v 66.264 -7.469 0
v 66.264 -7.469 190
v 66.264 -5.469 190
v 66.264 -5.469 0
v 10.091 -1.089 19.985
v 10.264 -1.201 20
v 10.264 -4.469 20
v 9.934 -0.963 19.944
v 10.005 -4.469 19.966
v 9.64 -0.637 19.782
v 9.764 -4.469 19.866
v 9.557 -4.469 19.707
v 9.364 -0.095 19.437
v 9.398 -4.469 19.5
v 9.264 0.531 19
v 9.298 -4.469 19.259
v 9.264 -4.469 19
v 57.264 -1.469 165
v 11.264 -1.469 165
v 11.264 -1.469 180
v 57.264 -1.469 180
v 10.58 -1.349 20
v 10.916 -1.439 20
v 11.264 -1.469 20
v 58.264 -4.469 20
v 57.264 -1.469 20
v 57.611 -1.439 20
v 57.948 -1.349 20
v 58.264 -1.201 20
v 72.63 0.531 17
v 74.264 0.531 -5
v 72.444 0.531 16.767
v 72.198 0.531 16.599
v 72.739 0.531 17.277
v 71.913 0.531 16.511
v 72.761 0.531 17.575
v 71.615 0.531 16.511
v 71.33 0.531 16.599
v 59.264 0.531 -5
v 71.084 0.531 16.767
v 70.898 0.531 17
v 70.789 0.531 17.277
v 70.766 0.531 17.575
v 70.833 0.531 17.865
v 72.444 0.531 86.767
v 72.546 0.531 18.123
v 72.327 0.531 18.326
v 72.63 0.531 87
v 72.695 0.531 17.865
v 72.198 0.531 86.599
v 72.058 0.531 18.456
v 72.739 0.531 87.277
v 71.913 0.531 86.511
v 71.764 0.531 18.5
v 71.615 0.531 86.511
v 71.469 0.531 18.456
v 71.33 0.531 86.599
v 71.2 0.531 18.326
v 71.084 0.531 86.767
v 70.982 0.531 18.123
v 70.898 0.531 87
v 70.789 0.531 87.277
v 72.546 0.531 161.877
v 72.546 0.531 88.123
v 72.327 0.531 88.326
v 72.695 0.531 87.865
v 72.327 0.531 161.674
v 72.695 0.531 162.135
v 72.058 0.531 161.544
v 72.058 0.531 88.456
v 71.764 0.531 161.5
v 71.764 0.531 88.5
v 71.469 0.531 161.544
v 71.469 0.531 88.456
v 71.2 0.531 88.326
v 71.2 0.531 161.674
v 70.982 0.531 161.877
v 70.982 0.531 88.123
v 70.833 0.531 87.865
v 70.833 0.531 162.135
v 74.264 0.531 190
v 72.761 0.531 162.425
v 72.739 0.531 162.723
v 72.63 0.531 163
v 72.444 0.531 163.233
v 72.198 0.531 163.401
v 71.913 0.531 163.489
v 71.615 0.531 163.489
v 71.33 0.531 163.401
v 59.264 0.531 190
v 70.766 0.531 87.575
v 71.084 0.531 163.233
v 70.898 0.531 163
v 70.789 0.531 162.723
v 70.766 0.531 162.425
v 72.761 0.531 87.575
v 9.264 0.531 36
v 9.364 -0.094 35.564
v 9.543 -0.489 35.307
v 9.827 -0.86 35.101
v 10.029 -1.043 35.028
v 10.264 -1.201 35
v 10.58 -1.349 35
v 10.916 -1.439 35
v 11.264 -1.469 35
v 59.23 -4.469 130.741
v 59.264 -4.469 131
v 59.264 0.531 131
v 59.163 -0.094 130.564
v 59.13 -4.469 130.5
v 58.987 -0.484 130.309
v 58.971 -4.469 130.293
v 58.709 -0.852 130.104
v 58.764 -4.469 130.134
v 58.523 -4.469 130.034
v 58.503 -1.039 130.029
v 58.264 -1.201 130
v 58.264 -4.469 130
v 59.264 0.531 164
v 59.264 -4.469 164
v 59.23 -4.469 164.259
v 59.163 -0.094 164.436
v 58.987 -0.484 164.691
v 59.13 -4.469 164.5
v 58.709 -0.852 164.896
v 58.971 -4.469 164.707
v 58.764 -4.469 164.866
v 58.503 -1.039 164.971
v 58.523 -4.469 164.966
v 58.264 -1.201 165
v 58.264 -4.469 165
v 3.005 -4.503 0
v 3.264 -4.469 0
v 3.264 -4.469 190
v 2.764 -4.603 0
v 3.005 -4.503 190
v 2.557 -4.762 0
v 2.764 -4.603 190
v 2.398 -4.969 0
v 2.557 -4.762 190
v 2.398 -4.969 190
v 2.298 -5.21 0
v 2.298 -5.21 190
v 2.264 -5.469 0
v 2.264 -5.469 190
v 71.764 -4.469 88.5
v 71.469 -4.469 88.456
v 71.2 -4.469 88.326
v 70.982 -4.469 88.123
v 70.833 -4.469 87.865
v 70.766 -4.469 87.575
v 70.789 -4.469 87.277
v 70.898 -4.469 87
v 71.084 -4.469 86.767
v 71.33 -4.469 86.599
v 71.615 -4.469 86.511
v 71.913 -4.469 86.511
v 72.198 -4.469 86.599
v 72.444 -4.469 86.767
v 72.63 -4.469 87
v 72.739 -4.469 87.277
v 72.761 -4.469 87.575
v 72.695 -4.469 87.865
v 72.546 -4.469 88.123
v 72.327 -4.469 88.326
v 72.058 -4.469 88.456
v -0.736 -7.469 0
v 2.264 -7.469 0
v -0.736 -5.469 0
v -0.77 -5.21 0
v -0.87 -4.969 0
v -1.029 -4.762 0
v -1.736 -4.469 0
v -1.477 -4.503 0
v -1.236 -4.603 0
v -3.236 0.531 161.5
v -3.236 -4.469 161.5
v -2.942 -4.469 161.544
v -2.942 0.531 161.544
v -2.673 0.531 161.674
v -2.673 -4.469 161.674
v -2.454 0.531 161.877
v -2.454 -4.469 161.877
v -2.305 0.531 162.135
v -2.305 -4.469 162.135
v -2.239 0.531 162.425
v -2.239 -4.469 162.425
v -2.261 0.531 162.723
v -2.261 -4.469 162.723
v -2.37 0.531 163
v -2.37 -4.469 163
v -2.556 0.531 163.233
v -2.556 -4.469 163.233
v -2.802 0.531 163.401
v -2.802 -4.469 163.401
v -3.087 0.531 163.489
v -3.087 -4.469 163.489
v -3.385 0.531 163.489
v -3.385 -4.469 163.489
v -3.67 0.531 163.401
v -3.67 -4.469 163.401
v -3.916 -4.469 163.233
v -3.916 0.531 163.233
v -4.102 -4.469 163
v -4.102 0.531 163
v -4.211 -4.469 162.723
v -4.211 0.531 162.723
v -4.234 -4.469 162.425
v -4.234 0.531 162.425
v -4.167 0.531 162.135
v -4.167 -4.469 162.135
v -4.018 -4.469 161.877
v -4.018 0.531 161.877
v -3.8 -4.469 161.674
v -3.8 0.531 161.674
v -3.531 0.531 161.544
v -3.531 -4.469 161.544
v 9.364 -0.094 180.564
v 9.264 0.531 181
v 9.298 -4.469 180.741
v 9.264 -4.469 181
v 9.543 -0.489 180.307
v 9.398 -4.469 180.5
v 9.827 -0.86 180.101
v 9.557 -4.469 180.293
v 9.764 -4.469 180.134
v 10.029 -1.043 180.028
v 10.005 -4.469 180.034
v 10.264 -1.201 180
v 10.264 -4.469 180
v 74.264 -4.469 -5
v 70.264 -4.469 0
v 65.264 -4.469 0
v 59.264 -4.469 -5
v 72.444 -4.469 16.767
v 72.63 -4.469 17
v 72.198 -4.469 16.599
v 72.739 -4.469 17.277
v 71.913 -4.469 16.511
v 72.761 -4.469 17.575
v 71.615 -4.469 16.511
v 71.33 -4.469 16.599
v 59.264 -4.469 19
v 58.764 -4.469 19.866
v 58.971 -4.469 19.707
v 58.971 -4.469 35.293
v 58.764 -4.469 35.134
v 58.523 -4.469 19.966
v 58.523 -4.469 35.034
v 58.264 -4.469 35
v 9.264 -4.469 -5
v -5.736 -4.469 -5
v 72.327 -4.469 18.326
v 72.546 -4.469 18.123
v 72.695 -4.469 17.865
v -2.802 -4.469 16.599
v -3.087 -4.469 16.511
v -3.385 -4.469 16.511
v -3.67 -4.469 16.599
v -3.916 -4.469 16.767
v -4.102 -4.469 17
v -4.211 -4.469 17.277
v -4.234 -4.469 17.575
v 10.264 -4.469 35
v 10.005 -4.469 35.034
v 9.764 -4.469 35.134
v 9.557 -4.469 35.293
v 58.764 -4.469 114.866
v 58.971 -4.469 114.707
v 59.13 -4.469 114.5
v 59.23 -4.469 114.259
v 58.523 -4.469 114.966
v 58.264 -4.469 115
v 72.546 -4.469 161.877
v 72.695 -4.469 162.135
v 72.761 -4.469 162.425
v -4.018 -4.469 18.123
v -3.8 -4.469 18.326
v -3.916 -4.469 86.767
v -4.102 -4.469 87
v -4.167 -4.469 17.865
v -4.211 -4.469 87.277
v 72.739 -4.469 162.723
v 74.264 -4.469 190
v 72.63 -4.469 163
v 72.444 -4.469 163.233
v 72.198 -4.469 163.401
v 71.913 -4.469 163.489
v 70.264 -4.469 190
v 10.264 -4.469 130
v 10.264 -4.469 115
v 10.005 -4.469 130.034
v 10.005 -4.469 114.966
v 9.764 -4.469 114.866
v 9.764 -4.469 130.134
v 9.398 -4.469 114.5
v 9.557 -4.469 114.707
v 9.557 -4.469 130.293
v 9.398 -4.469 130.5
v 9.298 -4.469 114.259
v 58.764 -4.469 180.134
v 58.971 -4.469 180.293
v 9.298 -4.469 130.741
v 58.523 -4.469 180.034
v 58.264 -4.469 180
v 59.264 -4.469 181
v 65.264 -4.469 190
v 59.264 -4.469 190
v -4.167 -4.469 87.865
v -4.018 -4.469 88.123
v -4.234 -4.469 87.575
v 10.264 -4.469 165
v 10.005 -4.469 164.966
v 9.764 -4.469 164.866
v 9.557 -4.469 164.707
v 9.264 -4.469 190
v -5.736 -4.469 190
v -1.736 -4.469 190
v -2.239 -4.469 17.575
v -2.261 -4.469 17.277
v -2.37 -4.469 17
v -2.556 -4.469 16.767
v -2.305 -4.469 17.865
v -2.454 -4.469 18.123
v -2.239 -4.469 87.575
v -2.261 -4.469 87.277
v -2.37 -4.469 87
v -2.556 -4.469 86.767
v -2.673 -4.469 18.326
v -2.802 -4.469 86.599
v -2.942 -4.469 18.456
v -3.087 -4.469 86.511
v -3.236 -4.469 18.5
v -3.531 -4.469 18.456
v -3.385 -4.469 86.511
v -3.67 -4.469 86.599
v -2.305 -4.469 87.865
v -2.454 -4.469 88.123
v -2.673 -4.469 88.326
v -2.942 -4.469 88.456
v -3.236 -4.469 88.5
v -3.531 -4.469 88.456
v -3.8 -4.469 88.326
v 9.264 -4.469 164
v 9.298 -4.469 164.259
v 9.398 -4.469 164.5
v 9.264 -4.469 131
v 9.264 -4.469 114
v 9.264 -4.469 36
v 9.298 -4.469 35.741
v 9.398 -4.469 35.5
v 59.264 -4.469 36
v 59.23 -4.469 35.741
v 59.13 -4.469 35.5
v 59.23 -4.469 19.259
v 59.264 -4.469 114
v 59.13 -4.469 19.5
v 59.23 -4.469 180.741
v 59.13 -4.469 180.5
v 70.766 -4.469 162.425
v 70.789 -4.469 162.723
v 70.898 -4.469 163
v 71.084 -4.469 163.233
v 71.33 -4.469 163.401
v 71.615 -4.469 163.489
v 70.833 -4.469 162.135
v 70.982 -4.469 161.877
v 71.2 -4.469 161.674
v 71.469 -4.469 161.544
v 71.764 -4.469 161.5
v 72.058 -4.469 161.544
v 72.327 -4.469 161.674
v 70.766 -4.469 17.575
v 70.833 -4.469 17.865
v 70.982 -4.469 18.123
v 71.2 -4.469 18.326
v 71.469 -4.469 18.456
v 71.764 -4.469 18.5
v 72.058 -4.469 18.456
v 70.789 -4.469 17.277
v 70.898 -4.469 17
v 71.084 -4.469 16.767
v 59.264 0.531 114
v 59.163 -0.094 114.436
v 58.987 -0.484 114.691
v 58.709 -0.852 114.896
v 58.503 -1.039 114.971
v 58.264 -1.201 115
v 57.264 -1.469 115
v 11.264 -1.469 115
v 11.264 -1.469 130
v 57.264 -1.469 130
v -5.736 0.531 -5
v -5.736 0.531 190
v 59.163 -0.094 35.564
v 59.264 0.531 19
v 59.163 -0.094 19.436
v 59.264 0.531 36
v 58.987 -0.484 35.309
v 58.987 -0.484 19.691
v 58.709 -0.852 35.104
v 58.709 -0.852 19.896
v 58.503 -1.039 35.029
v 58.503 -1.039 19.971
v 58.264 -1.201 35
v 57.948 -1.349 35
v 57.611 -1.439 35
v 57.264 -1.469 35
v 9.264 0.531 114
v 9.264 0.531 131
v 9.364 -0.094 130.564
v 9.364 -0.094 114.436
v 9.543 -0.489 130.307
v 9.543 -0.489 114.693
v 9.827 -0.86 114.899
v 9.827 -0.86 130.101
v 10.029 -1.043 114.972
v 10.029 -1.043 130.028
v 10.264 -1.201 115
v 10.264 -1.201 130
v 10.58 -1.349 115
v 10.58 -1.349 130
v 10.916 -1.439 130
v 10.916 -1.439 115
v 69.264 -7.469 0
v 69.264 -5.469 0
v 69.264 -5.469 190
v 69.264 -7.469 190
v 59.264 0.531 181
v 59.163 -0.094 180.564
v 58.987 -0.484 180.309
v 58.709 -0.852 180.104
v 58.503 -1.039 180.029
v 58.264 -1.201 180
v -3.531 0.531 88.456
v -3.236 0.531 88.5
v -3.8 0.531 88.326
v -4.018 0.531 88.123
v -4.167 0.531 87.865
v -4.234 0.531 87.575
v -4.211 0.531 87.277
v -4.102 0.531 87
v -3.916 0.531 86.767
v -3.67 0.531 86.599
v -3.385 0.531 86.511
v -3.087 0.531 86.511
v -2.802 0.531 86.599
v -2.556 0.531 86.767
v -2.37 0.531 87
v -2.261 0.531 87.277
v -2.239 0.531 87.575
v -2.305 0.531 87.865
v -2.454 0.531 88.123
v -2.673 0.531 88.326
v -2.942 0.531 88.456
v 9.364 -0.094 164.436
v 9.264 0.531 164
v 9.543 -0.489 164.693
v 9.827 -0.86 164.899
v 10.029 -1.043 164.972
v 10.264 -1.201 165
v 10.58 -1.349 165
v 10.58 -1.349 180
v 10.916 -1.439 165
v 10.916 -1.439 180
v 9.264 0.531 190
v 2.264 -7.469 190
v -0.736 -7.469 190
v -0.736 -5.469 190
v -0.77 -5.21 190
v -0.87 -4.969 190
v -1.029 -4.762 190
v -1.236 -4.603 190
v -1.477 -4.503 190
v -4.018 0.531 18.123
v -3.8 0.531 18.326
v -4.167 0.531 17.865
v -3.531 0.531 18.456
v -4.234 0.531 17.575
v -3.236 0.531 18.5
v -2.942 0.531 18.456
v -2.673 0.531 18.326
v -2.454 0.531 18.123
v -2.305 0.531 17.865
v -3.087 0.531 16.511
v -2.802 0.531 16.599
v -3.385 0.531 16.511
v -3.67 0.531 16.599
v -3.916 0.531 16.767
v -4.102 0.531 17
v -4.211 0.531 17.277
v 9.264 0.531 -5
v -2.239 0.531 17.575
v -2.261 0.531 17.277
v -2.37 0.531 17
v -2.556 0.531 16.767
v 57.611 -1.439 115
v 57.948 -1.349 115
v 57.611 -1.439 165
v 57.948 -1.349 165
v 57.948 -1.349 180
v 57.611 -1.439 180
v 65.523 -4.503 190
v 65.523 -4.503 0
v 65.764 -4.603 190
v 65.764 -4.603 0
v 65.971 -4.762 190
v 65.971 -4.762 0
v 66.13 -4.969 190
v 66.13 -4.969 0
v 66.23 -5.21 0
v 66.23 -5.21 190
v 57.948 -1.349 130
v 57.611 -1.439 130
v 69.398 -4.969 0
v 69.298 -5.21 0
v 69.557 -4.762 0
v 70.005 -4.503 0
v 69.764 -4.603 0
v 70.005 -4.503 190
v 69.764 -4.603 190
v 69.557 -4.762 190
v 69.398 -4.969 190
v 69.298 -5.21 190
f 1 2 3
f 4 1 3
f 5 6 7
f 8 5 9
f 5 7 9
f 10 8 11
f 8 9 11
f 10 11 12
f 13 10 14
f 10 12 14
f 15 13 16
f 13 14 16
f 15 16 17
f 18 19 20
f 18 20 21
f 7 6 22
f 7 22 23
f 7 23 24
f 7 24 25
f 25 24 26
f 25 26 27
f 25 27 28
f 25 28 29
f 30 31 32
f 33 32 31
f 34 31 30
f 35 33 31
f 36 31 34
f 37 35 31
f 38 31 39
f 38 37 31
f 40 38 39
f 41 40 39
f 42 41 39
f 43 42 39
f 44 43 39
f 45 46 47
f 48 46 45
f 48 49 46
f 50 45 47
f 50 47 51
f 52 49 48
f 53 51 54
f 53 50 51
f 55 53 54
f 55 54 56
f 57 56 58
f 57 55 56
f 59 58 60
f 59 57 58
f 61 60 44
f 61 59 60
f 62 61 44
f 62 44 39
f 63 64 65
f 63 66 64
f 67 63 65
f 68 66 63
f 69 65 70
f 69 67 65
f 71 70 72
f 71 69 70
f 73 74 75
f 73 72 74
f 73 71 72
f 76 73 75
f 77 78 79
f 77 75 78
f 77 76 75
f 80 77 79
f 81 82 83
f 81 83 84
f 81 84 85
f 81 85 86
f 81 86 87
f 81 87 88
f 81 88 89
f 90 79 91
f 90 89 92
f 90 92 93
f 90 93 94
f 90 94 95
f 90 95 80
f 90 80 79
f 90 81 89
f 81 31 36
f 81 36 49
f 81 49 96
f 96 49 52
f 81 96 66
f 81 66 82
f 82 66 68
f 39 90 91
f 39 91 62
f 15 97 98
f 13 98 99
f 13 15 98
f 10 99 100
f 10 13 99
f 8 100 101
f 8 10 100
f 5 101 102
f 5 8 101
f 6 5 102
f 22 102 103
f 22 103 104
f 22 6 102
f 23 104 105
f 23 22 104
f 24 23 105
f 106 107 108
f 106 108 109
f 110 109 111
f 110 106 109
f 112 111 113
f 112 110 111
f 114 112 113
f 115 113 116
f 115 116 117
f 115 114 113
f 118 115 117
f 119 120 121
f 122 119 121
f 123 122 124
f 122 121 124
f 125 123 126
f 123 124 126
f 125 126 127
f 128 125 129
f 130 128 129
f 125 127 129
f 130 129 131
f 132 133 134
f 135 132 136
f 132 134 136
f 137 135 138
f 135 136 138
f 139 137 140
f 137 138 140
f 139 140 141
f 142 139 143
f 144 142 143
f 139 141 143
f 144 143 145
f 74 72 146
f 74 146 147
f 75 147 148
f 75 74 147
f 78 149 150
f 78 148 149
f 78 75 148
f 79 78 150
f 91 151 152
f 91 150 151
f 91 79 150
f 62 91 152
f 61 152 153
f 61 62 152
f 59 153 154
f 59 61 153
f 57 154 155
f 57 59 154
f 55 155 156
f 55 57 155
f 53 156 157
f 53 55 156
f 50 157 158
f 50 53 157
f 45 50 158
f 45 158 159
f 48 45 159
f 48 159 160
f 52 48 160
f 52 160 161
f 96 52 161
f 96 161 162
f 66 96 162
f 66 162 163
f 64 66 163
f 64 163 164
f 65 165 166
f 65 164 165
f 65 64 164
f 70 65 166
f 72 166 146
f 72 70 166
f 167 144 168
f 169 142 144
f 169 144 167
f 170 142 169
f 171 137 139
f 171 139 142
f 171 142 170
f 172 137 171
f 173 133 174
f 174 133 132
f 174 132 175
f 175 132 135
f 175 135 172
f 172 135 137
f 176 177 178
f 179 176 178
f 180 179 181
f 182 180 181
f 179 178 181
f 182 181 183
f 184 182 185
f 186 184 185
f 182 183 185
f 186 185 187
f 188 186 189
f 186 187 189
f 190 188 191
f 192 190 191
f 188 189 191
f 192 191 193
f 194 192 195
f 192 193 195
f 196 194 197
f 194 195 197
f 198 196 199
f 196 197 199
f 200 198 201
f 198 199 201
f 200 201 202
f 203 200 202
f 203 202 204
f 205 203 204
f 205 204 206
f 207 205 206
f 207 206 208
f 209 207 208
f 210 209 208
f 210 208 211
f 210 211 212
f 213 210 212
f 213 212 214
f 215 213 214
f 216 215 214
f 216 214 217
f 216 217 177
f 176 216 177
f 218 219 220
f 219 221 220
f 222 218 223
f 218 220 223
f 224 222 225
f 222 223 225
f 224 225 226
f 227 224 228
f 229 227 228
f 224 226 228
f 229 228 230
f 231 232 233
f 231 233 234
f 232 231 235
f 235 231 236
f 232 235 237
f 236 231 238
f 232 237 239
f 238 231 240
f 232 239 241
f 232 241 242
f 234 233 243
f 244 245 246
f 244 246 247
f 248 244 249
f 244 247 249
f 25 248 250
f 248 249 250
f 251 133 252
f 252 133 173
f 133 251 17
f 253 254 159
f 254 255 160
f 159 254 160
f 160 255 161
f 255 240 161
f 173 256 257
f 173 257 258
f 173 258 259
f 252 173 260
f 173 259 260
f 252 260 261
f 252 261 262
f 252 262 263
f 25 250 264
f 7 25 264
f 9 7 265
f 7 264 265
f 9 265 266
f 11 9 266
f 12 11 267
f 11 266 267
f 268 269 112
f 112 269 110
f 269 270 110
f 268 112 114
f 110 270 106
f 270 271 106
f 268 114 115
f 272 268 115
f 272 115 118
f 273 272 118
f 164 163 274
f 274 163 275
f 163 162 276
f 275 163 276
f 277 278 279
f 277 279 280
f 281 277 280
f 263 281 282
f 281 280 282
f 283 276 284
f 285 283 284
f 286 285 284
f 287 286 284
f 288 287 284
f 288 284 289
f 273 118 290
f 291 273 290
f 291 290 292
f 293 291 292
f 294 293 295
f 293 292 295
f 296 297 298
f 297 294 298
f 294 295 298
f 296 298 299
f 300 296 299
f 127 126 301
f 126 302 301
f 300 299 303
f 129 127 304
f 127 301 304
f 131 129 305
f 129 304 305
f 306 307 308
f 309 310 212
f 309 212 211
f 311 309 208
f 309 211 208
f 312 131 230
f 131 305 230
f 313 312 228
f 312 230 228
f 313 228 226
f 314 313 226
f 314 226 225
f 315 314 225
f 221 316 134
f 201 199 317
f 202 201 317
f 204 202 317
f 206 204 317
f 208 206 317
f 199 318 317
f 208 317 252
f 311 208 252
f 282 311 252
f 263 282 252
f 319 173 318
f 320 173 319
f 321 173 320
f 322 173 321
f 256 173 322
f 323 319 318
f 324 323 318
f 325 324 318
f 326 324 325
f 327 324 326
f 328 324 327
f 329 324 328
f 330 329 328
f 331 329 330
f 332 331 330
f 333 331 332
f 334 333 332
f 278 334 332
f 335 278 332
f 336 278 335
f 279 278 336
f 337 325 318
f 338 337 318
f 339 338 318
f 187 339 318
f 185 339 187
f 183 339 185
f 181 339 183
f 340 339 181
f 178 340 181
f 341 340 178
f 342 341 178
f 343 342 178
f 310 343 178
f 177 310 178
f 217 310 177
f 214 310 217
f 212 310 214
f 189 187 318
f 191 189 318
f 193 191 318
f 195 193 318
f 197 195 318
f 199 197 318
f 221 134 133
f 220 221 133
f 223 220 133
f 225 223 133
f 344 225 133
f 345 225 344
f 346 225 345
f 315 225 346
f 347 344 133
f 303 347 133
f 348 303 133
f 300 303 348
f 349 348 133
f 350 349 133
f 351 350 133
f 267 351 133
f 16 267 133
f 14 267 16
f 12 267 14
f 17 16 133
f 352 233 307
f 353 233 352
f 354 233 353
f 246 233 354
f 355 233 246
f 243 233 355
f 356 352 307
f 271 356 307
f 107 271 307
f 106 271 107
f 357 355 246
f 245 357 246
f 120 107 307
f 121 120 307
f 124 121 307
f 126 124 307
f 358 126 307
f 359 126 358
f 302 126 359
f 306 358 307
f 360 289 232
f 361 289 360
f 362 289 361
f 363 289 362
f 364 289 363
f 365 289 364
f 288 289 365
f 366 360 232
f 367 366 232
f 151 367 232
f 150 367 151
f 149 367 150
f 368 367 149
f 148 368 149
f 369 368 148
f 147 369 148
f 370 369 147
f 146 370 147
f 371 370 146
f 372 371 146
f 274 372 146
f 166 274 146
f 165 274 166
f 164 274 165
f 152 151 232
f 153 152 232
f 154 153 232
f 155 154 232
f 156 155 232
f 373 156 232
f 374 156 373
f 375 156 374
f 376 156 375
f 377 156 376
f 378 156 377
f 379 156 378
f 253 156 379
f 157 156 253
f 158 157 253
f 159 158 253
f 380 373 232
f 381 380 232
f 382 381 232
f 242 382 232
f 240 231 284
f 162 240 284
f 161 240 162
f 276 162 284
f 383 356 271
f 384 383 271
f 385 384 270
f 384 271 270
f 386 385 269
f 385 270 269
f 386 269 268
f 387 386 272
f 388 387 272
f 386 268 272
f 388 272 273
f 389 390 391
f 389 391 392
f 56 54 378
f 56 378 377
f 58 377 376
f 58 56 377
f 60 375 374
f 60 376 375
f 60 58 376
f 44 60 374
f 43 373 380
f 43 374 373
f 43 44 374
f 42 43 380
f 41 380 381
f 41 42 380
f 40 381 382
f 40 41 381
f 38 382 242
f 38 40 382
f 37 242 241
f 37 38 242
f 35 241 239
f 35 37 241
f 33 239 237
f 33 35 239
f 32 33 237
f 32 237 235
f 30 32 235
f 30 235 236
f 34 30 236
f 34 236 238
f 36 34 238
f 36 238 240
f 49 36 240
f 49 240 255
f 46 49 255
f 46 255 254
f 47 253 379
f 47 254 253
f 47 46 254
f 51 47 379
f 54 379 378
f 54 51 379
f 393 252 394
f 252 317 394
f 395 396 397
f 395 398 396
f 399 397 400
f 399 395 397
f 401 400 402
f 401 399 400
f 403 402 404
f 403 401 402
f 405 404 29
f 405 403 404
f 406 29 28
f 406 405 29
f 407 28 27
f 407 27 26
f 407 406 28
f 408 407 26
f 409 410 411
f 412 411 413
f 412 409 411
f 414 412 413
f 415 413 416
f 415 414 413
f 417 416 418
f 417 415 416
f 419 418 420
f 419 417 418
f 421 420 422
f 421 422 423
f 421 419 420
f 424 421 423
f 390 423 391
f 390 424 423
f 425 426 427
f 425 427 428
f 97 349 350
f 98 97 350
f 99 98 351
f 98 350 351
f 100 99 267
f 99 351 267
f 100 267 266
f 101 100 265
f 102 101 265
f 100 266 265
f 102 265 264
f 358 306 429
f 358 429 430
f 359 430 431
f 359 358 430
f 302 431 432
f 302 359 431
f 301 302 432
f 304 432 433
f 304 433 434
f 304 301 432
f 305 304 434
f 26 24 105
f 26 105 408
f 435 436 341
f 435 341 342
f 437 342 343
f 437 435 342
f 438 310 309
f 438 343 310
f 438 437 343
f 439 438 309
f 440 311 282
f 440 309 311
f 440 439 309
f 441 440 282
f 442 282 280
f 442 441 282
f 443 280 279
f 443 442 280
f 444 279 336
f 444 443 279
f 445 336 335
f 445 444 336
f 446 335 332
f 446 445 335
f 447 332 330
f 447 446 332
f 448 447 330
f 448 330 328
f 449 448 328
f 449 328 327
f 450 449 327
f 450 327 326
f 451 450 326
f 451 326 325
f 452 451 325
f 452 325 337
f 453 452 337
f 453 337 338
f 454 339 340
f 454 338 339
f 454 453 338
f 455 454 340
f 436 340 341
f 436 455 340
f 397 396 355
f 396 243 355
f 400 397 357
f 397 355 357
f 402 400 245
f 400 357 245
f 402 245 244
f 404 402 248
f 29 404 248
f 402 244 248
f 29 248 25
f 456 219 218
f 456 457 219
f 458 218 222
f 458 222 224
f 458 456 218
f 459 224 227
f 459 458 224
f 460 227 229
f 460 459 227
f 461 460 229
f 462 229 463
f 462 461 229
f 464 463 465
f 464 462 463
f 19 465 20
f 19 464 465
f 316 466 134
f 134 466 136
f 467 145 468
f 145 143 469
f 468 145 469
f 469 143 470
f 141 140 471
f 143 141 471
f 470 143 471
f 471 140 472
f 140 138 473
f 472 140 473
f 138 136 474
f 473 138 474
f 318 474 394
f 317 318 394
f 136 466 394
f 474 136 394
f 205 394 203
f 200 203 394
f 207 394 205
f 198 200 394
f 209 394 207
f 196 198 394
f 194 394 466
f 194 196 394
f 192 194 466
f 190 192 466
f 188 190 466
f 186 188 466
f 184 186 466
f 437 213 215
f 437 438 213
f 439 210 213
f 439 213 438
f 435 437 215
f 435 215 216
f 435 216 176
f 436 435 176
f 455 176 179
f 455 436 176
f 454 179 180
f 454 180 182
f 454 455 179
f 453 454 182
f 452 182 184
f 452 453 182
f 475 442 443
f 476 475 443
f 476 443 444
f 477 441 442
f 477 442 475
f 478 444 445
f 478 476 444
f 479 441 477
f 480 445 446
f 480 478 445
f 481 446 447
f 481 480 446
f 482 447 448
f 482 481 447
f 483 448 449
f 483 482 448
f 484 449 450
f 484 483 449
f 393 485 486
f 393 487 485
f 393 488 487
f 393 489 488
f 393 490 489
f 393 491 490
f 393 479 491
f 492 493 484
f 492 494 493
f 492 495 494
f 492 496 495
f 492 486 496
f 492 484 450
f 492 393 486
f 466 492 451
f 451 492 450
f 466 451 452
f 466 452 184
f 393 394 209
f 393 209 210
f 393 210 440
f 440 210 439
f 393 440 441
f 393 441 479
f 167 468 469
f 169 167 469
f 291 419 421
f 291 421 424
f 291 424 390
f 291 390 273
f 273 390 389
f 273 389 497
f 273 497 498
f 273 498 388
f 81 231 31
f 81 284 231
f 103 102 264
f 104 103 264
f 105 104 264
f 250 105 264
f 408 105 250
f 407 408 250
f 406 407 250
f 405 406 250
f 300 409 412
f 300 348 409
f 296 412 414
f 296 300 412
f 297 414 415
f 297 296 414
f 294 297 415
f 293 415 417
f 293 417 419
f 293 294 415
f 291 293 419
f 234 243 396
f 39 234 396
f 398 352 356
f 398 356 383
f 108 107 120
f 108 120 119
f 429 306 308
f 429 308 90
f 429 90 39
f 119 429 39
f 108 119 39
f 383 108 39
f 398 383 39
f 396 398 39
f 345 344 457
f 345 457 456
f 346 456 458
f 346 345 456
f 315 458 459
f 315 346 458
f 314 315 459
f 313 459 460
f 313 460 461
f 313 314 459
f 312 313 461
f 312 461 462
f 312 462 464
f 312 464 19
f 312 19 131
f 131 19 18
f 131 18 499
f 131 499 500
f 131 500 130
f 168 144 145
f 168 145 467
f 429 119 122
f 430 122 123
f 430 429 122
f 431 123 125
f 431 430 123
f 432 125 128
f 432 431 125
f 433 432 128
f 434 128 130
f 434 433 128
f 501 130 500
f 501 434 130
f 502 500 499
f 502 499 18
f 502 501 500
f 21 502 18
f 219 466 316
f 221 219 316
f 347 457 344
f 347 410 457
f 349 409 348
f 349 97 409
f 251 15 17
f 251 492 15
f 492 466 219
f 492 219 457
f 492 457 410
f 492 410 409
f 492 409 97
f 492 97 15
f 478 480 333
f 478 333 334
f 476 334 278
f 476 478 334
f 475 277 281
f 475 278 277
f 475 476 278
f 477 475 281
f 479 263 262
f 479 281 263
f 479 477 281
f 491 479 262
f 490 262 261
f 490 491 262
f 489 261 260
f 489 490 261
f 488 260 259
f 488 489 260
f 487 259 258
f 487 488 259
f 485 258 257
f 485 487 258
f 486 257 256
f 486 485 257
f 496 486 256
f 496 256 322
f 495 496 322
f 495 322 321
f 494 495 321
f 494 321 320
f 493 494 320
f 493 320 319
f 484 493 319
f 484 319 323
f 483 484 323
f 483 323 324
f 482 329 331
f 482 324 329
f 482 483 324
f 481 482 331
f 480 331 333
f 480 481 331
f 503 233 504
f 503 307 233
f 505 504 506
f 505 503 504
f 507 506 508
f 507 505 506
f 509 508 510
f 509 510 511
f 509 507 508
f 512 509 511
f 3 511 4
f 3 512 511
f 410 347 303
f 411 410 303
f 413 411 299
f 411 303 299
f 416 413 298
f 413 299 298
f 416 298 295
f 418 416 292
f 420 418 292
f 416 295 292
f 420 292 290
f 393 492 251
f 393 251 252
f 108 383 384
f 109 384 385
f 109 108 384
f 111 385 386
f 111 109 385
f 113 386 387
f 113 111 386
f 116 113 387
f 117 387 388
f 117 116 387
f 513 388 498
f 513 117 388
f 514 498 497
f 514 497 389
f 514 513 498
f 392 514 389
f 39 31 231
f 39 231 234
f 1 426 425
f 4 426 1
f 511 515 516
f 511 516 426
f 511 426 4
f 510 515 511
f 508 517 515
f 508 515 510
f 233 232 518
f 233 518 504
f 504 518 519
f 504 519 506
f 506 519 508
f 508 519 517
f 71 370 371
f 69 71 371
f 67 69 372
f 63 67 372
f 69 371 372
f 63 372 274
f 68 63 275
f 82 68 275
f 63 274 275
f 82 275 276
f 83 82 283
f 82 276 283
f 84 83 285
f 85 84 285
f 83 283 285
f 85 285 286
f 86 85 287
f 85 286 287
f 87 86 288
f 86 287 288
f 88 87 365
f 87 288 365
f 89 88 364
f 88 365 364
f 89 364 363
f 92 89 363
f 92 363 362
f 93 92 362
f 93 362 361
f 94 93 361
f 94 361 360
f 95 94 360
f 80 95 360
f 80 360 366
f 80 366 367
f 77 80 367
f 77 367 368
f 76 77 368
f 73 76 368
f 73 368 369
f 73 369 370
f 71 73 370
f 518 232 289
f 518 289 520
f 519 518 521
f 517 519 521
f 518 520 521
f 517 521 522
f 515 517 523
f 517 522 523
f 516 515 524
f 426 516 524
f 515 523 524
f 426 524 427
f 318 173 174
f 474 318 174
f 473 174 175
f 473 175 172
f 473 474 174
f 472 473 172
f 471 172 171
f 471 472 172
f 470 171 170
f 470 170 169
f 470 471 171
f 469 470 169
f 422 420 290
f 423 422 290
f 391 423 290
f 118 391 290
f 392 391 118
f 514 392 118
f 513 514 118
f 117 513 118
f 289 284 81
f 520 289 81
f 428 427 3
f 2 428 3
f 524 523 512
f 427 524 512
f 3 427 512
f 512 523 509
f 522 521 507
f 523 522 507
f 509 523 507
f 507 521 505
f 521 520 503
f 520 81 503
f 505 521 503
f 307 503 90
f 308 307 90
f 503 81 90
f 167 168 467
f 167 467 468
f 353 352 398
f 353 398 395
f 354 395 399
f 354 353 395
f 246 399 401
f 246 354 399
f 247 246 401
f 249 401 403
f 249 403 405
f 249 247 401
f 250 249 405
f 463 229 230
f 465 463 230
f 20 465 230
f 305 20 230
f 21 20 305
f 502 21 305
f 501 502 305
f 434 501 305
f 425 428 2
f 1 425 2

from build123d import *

# Parameters (mm, degrees)
BOSS_EXTRUDE1_DEPTH     = 190
SKETCH2_W               = 50
SKETCH2_H               = 20
CUT_EXTRUDE1_DEPTH      = 50
SKETCH3_W               = 50
SKETCH3_H               = 80
CUT_EXTRUDE2_DEPTH      = 50
SKETCH4_W               = 50
SKETCH4_H               = 35
CUT_EXTRUDE4_DEPTH      = 50
SKETCH9_W               = 15
SKETCH9_H               = 5
BOSS_EXTRUDE4_DEPTH     = 5
SKETCH5_R               = 1
CUT_EXTRUDE5_DEPTH      = 10
CUT_EXTRUDE6_DEPTH      = 100
CUT_EXTRUDE6_DEPTH_BACK = 10
SKETCH6_R               = 1
FILLET1_R               = 1
FILLET2_R               = 2


with BuildPart() as part:
    # Sketch1 → Boss-Extrude1 (new body)
    with BuildSketch(Plane.XY):
        Polygon((-5.73630137, 0.530821918), (9.26369863, 0.530821918), (9.26369863, -1.469178082), (59.26369863, -1.469178082), (59.26369863, 0.530821918), (74.26369863, 0.530821918), (74.26369863, -4.469178082), (69.26369863, -4.469178082), (69.26369863, -7.469178082), (66.26369863, -7.469178082), (66.26369863, -4.469178082), (2.26369863, -4.469178082), (2.26369863, -7.469178082), (-0.73630137, -7.469178082), (-0.73630137, -4.469178082), (-5.73630137, -4.469178082), align=None)
    extrude(amount=BOSS_EXTRUDE1_DEPTH)

    # Sketch2 → Cut-Extrude1 (cut)
    with BuildSketch(Plane(origin=(0, -1.469178082, 0), x_dir=(1, 0, 0), z_dir=(0, 1, 0))):
        with Locations((34.26369863, -10)):
            Rectangle(SKETCH2_W, SKETCH2_H)
        with Locations((34.26369863, -190)):
            Rectangle(SKETCH2_W, SKETCH2_H)
    extrude(amount=-CUT_EXTRUDE1_DEPTH, mode=Mode.SUBTRACT)

    # Sketch3 → Cut-Extrude2 (cut)
    with BuildSketch(Plane(origin=(0, -1.469178082, 0), x_dir=(1, 0, 0), z_dir=(0, 1, 0))):
        with Locations((34.26369863, -75)):
            Rectangle(SKETCH3_W, SKETCH3_H)
    extrude(amount=-CUT_EXTRUDE2_DEPTH, mode=Mode.SUBTRACT)

    # Sketch4 → Cut-Extrude4 (cut)
    with BuildSketch(Plane(origin=(0, -1.469178082, 0), x_dir=(1, 0, 0), z_dir=(0, 1, 0))):
        with Locations((34.26369863, -147.5)):
            Rectangle(SKETCH4_W, SKETCH4_H)
    extrude(amount=-CUT_EXTRUDE4_DEPTH, mode=Mode.SUBTRACT)

    # Sketch9 → Boss-Extrude4 (add)
    with BuildSketch(Plane(origin=(0, 0, 0), x_dir=(-1, 0, 0), z_dir=(0, 0, -1))):
        with Locations((-66.76369863, -1.969178082)):
            Rectangle(SKETCH9_W, SKETCH9_H)
        with Locations((-1.76369863, -1.969178082)):
            Rectangle(SKETCH9_W, SKETCH9_H)
    extrude(amount=BOSS_EXTRUDE4_DEPTH)

    # Sketch5 → Cut-Extrude5 (cut)
    with BuildSketch(Plane(origin=(0, -4.469178082, 0), x_dir=(-1, 0, 0), z_dir=(0, -1, 0))):
        with Locations(Location((-71.76369863, -162.5, 0), (0, 0, 90))):
            Circle(SKETCH5_R)
        with Locations(Location((3.23630137, -162.5, 0), (0, 0, 90))):
            Circle(SKETCH5_R)
    extrude(amount=-CUT_EXTRUDE5_DEPTH, mode=Mode.SUBTRACT)

    # Sketch6 → Cut-Extrude6 (cut, two sides: drawn at the far end of the back side and taken through both)
    with BuildSketch(Plane(origin=(0, -4.469178082, 0), x_dir=(-1, 0, 0), z_dir=(0, -1, 0)).offset(-CUT_EXTRUDE6_DEPTH_BACK)):
        with Locations(Location((3.23630137, -87.5, 0), (0, 0, 270))):
            Circle(SKETCH6_R)
        with Locations(Location((3.23630137, -17.5, 0), (0, 0, 270))):
            Circle(SKETCH6_R)
        with Locations(Location((-71.76369863, -17.5, 0), (0, 0, 270))):
            Circle(SKETCH6_R)
        with Locations(Location((-71.76369863, -87.5, 0), (0, 0, 270))):
            Circle(SKETCH6_R)
    extrude(amount=CUT_EXTRUDE6_DEPTH + CUT_EXTRUDE6_DEPTH_BACK, mode=Mode.SUBTRACT)

    # Fillet1
    fillet1_edges = [part.edges().sort_by_distance(p)[0] for p in [
        (9.26369863, -2.969178082, 165),
        (59.26369863, -2.969178082, 130),
        (9.26369863, -2.969178082, 130),
        (59.26369863, -2.969178082, 165),
        (69.26369863, -4.469178082, 95),
        (66.26369863, -4.469178082, 95),
        (2.26369863, -4.469178082, 95),
        (-0.73630137, -4.469178082, 95),
        (59.26369863, -2.969178082, 20),
        (9.26369863, -2.969178082, 20),
        (9.26369863, -2.969178082, 180),
        (59.26369863, -2.969178082, 180),
        (9.26369863, -2.969178082, 115),
        (59.26369863, -2.969178082, 35),
        (9.26369863, -2.969178082, 35),
        (59.26369863, -2.969178082, 115),
    ]]
    fillet(fillet1_edges, radius=FILLET1_R)

    # Fillet2
    fillet2_edges = [part.edges().sort_by_distance(p)[0] for p in [
        (59.26369863, -1.469178082, 27.5),
        (9.26369863, -1.469178082, 27.5),
        (9.26369863, -1.469178082, 172.5),
        (59.26369863, -1.469178082, 172.5),
        (59.26369863, -1.469178082, 122.5),
        (9.26369863, -1.469178082, 122.5),
    ]]
    fillet(fillet2_edges, radius=FILLET2_R - 0.0001)  # a hair under: the kernel refuses the full size


solid = part.part
